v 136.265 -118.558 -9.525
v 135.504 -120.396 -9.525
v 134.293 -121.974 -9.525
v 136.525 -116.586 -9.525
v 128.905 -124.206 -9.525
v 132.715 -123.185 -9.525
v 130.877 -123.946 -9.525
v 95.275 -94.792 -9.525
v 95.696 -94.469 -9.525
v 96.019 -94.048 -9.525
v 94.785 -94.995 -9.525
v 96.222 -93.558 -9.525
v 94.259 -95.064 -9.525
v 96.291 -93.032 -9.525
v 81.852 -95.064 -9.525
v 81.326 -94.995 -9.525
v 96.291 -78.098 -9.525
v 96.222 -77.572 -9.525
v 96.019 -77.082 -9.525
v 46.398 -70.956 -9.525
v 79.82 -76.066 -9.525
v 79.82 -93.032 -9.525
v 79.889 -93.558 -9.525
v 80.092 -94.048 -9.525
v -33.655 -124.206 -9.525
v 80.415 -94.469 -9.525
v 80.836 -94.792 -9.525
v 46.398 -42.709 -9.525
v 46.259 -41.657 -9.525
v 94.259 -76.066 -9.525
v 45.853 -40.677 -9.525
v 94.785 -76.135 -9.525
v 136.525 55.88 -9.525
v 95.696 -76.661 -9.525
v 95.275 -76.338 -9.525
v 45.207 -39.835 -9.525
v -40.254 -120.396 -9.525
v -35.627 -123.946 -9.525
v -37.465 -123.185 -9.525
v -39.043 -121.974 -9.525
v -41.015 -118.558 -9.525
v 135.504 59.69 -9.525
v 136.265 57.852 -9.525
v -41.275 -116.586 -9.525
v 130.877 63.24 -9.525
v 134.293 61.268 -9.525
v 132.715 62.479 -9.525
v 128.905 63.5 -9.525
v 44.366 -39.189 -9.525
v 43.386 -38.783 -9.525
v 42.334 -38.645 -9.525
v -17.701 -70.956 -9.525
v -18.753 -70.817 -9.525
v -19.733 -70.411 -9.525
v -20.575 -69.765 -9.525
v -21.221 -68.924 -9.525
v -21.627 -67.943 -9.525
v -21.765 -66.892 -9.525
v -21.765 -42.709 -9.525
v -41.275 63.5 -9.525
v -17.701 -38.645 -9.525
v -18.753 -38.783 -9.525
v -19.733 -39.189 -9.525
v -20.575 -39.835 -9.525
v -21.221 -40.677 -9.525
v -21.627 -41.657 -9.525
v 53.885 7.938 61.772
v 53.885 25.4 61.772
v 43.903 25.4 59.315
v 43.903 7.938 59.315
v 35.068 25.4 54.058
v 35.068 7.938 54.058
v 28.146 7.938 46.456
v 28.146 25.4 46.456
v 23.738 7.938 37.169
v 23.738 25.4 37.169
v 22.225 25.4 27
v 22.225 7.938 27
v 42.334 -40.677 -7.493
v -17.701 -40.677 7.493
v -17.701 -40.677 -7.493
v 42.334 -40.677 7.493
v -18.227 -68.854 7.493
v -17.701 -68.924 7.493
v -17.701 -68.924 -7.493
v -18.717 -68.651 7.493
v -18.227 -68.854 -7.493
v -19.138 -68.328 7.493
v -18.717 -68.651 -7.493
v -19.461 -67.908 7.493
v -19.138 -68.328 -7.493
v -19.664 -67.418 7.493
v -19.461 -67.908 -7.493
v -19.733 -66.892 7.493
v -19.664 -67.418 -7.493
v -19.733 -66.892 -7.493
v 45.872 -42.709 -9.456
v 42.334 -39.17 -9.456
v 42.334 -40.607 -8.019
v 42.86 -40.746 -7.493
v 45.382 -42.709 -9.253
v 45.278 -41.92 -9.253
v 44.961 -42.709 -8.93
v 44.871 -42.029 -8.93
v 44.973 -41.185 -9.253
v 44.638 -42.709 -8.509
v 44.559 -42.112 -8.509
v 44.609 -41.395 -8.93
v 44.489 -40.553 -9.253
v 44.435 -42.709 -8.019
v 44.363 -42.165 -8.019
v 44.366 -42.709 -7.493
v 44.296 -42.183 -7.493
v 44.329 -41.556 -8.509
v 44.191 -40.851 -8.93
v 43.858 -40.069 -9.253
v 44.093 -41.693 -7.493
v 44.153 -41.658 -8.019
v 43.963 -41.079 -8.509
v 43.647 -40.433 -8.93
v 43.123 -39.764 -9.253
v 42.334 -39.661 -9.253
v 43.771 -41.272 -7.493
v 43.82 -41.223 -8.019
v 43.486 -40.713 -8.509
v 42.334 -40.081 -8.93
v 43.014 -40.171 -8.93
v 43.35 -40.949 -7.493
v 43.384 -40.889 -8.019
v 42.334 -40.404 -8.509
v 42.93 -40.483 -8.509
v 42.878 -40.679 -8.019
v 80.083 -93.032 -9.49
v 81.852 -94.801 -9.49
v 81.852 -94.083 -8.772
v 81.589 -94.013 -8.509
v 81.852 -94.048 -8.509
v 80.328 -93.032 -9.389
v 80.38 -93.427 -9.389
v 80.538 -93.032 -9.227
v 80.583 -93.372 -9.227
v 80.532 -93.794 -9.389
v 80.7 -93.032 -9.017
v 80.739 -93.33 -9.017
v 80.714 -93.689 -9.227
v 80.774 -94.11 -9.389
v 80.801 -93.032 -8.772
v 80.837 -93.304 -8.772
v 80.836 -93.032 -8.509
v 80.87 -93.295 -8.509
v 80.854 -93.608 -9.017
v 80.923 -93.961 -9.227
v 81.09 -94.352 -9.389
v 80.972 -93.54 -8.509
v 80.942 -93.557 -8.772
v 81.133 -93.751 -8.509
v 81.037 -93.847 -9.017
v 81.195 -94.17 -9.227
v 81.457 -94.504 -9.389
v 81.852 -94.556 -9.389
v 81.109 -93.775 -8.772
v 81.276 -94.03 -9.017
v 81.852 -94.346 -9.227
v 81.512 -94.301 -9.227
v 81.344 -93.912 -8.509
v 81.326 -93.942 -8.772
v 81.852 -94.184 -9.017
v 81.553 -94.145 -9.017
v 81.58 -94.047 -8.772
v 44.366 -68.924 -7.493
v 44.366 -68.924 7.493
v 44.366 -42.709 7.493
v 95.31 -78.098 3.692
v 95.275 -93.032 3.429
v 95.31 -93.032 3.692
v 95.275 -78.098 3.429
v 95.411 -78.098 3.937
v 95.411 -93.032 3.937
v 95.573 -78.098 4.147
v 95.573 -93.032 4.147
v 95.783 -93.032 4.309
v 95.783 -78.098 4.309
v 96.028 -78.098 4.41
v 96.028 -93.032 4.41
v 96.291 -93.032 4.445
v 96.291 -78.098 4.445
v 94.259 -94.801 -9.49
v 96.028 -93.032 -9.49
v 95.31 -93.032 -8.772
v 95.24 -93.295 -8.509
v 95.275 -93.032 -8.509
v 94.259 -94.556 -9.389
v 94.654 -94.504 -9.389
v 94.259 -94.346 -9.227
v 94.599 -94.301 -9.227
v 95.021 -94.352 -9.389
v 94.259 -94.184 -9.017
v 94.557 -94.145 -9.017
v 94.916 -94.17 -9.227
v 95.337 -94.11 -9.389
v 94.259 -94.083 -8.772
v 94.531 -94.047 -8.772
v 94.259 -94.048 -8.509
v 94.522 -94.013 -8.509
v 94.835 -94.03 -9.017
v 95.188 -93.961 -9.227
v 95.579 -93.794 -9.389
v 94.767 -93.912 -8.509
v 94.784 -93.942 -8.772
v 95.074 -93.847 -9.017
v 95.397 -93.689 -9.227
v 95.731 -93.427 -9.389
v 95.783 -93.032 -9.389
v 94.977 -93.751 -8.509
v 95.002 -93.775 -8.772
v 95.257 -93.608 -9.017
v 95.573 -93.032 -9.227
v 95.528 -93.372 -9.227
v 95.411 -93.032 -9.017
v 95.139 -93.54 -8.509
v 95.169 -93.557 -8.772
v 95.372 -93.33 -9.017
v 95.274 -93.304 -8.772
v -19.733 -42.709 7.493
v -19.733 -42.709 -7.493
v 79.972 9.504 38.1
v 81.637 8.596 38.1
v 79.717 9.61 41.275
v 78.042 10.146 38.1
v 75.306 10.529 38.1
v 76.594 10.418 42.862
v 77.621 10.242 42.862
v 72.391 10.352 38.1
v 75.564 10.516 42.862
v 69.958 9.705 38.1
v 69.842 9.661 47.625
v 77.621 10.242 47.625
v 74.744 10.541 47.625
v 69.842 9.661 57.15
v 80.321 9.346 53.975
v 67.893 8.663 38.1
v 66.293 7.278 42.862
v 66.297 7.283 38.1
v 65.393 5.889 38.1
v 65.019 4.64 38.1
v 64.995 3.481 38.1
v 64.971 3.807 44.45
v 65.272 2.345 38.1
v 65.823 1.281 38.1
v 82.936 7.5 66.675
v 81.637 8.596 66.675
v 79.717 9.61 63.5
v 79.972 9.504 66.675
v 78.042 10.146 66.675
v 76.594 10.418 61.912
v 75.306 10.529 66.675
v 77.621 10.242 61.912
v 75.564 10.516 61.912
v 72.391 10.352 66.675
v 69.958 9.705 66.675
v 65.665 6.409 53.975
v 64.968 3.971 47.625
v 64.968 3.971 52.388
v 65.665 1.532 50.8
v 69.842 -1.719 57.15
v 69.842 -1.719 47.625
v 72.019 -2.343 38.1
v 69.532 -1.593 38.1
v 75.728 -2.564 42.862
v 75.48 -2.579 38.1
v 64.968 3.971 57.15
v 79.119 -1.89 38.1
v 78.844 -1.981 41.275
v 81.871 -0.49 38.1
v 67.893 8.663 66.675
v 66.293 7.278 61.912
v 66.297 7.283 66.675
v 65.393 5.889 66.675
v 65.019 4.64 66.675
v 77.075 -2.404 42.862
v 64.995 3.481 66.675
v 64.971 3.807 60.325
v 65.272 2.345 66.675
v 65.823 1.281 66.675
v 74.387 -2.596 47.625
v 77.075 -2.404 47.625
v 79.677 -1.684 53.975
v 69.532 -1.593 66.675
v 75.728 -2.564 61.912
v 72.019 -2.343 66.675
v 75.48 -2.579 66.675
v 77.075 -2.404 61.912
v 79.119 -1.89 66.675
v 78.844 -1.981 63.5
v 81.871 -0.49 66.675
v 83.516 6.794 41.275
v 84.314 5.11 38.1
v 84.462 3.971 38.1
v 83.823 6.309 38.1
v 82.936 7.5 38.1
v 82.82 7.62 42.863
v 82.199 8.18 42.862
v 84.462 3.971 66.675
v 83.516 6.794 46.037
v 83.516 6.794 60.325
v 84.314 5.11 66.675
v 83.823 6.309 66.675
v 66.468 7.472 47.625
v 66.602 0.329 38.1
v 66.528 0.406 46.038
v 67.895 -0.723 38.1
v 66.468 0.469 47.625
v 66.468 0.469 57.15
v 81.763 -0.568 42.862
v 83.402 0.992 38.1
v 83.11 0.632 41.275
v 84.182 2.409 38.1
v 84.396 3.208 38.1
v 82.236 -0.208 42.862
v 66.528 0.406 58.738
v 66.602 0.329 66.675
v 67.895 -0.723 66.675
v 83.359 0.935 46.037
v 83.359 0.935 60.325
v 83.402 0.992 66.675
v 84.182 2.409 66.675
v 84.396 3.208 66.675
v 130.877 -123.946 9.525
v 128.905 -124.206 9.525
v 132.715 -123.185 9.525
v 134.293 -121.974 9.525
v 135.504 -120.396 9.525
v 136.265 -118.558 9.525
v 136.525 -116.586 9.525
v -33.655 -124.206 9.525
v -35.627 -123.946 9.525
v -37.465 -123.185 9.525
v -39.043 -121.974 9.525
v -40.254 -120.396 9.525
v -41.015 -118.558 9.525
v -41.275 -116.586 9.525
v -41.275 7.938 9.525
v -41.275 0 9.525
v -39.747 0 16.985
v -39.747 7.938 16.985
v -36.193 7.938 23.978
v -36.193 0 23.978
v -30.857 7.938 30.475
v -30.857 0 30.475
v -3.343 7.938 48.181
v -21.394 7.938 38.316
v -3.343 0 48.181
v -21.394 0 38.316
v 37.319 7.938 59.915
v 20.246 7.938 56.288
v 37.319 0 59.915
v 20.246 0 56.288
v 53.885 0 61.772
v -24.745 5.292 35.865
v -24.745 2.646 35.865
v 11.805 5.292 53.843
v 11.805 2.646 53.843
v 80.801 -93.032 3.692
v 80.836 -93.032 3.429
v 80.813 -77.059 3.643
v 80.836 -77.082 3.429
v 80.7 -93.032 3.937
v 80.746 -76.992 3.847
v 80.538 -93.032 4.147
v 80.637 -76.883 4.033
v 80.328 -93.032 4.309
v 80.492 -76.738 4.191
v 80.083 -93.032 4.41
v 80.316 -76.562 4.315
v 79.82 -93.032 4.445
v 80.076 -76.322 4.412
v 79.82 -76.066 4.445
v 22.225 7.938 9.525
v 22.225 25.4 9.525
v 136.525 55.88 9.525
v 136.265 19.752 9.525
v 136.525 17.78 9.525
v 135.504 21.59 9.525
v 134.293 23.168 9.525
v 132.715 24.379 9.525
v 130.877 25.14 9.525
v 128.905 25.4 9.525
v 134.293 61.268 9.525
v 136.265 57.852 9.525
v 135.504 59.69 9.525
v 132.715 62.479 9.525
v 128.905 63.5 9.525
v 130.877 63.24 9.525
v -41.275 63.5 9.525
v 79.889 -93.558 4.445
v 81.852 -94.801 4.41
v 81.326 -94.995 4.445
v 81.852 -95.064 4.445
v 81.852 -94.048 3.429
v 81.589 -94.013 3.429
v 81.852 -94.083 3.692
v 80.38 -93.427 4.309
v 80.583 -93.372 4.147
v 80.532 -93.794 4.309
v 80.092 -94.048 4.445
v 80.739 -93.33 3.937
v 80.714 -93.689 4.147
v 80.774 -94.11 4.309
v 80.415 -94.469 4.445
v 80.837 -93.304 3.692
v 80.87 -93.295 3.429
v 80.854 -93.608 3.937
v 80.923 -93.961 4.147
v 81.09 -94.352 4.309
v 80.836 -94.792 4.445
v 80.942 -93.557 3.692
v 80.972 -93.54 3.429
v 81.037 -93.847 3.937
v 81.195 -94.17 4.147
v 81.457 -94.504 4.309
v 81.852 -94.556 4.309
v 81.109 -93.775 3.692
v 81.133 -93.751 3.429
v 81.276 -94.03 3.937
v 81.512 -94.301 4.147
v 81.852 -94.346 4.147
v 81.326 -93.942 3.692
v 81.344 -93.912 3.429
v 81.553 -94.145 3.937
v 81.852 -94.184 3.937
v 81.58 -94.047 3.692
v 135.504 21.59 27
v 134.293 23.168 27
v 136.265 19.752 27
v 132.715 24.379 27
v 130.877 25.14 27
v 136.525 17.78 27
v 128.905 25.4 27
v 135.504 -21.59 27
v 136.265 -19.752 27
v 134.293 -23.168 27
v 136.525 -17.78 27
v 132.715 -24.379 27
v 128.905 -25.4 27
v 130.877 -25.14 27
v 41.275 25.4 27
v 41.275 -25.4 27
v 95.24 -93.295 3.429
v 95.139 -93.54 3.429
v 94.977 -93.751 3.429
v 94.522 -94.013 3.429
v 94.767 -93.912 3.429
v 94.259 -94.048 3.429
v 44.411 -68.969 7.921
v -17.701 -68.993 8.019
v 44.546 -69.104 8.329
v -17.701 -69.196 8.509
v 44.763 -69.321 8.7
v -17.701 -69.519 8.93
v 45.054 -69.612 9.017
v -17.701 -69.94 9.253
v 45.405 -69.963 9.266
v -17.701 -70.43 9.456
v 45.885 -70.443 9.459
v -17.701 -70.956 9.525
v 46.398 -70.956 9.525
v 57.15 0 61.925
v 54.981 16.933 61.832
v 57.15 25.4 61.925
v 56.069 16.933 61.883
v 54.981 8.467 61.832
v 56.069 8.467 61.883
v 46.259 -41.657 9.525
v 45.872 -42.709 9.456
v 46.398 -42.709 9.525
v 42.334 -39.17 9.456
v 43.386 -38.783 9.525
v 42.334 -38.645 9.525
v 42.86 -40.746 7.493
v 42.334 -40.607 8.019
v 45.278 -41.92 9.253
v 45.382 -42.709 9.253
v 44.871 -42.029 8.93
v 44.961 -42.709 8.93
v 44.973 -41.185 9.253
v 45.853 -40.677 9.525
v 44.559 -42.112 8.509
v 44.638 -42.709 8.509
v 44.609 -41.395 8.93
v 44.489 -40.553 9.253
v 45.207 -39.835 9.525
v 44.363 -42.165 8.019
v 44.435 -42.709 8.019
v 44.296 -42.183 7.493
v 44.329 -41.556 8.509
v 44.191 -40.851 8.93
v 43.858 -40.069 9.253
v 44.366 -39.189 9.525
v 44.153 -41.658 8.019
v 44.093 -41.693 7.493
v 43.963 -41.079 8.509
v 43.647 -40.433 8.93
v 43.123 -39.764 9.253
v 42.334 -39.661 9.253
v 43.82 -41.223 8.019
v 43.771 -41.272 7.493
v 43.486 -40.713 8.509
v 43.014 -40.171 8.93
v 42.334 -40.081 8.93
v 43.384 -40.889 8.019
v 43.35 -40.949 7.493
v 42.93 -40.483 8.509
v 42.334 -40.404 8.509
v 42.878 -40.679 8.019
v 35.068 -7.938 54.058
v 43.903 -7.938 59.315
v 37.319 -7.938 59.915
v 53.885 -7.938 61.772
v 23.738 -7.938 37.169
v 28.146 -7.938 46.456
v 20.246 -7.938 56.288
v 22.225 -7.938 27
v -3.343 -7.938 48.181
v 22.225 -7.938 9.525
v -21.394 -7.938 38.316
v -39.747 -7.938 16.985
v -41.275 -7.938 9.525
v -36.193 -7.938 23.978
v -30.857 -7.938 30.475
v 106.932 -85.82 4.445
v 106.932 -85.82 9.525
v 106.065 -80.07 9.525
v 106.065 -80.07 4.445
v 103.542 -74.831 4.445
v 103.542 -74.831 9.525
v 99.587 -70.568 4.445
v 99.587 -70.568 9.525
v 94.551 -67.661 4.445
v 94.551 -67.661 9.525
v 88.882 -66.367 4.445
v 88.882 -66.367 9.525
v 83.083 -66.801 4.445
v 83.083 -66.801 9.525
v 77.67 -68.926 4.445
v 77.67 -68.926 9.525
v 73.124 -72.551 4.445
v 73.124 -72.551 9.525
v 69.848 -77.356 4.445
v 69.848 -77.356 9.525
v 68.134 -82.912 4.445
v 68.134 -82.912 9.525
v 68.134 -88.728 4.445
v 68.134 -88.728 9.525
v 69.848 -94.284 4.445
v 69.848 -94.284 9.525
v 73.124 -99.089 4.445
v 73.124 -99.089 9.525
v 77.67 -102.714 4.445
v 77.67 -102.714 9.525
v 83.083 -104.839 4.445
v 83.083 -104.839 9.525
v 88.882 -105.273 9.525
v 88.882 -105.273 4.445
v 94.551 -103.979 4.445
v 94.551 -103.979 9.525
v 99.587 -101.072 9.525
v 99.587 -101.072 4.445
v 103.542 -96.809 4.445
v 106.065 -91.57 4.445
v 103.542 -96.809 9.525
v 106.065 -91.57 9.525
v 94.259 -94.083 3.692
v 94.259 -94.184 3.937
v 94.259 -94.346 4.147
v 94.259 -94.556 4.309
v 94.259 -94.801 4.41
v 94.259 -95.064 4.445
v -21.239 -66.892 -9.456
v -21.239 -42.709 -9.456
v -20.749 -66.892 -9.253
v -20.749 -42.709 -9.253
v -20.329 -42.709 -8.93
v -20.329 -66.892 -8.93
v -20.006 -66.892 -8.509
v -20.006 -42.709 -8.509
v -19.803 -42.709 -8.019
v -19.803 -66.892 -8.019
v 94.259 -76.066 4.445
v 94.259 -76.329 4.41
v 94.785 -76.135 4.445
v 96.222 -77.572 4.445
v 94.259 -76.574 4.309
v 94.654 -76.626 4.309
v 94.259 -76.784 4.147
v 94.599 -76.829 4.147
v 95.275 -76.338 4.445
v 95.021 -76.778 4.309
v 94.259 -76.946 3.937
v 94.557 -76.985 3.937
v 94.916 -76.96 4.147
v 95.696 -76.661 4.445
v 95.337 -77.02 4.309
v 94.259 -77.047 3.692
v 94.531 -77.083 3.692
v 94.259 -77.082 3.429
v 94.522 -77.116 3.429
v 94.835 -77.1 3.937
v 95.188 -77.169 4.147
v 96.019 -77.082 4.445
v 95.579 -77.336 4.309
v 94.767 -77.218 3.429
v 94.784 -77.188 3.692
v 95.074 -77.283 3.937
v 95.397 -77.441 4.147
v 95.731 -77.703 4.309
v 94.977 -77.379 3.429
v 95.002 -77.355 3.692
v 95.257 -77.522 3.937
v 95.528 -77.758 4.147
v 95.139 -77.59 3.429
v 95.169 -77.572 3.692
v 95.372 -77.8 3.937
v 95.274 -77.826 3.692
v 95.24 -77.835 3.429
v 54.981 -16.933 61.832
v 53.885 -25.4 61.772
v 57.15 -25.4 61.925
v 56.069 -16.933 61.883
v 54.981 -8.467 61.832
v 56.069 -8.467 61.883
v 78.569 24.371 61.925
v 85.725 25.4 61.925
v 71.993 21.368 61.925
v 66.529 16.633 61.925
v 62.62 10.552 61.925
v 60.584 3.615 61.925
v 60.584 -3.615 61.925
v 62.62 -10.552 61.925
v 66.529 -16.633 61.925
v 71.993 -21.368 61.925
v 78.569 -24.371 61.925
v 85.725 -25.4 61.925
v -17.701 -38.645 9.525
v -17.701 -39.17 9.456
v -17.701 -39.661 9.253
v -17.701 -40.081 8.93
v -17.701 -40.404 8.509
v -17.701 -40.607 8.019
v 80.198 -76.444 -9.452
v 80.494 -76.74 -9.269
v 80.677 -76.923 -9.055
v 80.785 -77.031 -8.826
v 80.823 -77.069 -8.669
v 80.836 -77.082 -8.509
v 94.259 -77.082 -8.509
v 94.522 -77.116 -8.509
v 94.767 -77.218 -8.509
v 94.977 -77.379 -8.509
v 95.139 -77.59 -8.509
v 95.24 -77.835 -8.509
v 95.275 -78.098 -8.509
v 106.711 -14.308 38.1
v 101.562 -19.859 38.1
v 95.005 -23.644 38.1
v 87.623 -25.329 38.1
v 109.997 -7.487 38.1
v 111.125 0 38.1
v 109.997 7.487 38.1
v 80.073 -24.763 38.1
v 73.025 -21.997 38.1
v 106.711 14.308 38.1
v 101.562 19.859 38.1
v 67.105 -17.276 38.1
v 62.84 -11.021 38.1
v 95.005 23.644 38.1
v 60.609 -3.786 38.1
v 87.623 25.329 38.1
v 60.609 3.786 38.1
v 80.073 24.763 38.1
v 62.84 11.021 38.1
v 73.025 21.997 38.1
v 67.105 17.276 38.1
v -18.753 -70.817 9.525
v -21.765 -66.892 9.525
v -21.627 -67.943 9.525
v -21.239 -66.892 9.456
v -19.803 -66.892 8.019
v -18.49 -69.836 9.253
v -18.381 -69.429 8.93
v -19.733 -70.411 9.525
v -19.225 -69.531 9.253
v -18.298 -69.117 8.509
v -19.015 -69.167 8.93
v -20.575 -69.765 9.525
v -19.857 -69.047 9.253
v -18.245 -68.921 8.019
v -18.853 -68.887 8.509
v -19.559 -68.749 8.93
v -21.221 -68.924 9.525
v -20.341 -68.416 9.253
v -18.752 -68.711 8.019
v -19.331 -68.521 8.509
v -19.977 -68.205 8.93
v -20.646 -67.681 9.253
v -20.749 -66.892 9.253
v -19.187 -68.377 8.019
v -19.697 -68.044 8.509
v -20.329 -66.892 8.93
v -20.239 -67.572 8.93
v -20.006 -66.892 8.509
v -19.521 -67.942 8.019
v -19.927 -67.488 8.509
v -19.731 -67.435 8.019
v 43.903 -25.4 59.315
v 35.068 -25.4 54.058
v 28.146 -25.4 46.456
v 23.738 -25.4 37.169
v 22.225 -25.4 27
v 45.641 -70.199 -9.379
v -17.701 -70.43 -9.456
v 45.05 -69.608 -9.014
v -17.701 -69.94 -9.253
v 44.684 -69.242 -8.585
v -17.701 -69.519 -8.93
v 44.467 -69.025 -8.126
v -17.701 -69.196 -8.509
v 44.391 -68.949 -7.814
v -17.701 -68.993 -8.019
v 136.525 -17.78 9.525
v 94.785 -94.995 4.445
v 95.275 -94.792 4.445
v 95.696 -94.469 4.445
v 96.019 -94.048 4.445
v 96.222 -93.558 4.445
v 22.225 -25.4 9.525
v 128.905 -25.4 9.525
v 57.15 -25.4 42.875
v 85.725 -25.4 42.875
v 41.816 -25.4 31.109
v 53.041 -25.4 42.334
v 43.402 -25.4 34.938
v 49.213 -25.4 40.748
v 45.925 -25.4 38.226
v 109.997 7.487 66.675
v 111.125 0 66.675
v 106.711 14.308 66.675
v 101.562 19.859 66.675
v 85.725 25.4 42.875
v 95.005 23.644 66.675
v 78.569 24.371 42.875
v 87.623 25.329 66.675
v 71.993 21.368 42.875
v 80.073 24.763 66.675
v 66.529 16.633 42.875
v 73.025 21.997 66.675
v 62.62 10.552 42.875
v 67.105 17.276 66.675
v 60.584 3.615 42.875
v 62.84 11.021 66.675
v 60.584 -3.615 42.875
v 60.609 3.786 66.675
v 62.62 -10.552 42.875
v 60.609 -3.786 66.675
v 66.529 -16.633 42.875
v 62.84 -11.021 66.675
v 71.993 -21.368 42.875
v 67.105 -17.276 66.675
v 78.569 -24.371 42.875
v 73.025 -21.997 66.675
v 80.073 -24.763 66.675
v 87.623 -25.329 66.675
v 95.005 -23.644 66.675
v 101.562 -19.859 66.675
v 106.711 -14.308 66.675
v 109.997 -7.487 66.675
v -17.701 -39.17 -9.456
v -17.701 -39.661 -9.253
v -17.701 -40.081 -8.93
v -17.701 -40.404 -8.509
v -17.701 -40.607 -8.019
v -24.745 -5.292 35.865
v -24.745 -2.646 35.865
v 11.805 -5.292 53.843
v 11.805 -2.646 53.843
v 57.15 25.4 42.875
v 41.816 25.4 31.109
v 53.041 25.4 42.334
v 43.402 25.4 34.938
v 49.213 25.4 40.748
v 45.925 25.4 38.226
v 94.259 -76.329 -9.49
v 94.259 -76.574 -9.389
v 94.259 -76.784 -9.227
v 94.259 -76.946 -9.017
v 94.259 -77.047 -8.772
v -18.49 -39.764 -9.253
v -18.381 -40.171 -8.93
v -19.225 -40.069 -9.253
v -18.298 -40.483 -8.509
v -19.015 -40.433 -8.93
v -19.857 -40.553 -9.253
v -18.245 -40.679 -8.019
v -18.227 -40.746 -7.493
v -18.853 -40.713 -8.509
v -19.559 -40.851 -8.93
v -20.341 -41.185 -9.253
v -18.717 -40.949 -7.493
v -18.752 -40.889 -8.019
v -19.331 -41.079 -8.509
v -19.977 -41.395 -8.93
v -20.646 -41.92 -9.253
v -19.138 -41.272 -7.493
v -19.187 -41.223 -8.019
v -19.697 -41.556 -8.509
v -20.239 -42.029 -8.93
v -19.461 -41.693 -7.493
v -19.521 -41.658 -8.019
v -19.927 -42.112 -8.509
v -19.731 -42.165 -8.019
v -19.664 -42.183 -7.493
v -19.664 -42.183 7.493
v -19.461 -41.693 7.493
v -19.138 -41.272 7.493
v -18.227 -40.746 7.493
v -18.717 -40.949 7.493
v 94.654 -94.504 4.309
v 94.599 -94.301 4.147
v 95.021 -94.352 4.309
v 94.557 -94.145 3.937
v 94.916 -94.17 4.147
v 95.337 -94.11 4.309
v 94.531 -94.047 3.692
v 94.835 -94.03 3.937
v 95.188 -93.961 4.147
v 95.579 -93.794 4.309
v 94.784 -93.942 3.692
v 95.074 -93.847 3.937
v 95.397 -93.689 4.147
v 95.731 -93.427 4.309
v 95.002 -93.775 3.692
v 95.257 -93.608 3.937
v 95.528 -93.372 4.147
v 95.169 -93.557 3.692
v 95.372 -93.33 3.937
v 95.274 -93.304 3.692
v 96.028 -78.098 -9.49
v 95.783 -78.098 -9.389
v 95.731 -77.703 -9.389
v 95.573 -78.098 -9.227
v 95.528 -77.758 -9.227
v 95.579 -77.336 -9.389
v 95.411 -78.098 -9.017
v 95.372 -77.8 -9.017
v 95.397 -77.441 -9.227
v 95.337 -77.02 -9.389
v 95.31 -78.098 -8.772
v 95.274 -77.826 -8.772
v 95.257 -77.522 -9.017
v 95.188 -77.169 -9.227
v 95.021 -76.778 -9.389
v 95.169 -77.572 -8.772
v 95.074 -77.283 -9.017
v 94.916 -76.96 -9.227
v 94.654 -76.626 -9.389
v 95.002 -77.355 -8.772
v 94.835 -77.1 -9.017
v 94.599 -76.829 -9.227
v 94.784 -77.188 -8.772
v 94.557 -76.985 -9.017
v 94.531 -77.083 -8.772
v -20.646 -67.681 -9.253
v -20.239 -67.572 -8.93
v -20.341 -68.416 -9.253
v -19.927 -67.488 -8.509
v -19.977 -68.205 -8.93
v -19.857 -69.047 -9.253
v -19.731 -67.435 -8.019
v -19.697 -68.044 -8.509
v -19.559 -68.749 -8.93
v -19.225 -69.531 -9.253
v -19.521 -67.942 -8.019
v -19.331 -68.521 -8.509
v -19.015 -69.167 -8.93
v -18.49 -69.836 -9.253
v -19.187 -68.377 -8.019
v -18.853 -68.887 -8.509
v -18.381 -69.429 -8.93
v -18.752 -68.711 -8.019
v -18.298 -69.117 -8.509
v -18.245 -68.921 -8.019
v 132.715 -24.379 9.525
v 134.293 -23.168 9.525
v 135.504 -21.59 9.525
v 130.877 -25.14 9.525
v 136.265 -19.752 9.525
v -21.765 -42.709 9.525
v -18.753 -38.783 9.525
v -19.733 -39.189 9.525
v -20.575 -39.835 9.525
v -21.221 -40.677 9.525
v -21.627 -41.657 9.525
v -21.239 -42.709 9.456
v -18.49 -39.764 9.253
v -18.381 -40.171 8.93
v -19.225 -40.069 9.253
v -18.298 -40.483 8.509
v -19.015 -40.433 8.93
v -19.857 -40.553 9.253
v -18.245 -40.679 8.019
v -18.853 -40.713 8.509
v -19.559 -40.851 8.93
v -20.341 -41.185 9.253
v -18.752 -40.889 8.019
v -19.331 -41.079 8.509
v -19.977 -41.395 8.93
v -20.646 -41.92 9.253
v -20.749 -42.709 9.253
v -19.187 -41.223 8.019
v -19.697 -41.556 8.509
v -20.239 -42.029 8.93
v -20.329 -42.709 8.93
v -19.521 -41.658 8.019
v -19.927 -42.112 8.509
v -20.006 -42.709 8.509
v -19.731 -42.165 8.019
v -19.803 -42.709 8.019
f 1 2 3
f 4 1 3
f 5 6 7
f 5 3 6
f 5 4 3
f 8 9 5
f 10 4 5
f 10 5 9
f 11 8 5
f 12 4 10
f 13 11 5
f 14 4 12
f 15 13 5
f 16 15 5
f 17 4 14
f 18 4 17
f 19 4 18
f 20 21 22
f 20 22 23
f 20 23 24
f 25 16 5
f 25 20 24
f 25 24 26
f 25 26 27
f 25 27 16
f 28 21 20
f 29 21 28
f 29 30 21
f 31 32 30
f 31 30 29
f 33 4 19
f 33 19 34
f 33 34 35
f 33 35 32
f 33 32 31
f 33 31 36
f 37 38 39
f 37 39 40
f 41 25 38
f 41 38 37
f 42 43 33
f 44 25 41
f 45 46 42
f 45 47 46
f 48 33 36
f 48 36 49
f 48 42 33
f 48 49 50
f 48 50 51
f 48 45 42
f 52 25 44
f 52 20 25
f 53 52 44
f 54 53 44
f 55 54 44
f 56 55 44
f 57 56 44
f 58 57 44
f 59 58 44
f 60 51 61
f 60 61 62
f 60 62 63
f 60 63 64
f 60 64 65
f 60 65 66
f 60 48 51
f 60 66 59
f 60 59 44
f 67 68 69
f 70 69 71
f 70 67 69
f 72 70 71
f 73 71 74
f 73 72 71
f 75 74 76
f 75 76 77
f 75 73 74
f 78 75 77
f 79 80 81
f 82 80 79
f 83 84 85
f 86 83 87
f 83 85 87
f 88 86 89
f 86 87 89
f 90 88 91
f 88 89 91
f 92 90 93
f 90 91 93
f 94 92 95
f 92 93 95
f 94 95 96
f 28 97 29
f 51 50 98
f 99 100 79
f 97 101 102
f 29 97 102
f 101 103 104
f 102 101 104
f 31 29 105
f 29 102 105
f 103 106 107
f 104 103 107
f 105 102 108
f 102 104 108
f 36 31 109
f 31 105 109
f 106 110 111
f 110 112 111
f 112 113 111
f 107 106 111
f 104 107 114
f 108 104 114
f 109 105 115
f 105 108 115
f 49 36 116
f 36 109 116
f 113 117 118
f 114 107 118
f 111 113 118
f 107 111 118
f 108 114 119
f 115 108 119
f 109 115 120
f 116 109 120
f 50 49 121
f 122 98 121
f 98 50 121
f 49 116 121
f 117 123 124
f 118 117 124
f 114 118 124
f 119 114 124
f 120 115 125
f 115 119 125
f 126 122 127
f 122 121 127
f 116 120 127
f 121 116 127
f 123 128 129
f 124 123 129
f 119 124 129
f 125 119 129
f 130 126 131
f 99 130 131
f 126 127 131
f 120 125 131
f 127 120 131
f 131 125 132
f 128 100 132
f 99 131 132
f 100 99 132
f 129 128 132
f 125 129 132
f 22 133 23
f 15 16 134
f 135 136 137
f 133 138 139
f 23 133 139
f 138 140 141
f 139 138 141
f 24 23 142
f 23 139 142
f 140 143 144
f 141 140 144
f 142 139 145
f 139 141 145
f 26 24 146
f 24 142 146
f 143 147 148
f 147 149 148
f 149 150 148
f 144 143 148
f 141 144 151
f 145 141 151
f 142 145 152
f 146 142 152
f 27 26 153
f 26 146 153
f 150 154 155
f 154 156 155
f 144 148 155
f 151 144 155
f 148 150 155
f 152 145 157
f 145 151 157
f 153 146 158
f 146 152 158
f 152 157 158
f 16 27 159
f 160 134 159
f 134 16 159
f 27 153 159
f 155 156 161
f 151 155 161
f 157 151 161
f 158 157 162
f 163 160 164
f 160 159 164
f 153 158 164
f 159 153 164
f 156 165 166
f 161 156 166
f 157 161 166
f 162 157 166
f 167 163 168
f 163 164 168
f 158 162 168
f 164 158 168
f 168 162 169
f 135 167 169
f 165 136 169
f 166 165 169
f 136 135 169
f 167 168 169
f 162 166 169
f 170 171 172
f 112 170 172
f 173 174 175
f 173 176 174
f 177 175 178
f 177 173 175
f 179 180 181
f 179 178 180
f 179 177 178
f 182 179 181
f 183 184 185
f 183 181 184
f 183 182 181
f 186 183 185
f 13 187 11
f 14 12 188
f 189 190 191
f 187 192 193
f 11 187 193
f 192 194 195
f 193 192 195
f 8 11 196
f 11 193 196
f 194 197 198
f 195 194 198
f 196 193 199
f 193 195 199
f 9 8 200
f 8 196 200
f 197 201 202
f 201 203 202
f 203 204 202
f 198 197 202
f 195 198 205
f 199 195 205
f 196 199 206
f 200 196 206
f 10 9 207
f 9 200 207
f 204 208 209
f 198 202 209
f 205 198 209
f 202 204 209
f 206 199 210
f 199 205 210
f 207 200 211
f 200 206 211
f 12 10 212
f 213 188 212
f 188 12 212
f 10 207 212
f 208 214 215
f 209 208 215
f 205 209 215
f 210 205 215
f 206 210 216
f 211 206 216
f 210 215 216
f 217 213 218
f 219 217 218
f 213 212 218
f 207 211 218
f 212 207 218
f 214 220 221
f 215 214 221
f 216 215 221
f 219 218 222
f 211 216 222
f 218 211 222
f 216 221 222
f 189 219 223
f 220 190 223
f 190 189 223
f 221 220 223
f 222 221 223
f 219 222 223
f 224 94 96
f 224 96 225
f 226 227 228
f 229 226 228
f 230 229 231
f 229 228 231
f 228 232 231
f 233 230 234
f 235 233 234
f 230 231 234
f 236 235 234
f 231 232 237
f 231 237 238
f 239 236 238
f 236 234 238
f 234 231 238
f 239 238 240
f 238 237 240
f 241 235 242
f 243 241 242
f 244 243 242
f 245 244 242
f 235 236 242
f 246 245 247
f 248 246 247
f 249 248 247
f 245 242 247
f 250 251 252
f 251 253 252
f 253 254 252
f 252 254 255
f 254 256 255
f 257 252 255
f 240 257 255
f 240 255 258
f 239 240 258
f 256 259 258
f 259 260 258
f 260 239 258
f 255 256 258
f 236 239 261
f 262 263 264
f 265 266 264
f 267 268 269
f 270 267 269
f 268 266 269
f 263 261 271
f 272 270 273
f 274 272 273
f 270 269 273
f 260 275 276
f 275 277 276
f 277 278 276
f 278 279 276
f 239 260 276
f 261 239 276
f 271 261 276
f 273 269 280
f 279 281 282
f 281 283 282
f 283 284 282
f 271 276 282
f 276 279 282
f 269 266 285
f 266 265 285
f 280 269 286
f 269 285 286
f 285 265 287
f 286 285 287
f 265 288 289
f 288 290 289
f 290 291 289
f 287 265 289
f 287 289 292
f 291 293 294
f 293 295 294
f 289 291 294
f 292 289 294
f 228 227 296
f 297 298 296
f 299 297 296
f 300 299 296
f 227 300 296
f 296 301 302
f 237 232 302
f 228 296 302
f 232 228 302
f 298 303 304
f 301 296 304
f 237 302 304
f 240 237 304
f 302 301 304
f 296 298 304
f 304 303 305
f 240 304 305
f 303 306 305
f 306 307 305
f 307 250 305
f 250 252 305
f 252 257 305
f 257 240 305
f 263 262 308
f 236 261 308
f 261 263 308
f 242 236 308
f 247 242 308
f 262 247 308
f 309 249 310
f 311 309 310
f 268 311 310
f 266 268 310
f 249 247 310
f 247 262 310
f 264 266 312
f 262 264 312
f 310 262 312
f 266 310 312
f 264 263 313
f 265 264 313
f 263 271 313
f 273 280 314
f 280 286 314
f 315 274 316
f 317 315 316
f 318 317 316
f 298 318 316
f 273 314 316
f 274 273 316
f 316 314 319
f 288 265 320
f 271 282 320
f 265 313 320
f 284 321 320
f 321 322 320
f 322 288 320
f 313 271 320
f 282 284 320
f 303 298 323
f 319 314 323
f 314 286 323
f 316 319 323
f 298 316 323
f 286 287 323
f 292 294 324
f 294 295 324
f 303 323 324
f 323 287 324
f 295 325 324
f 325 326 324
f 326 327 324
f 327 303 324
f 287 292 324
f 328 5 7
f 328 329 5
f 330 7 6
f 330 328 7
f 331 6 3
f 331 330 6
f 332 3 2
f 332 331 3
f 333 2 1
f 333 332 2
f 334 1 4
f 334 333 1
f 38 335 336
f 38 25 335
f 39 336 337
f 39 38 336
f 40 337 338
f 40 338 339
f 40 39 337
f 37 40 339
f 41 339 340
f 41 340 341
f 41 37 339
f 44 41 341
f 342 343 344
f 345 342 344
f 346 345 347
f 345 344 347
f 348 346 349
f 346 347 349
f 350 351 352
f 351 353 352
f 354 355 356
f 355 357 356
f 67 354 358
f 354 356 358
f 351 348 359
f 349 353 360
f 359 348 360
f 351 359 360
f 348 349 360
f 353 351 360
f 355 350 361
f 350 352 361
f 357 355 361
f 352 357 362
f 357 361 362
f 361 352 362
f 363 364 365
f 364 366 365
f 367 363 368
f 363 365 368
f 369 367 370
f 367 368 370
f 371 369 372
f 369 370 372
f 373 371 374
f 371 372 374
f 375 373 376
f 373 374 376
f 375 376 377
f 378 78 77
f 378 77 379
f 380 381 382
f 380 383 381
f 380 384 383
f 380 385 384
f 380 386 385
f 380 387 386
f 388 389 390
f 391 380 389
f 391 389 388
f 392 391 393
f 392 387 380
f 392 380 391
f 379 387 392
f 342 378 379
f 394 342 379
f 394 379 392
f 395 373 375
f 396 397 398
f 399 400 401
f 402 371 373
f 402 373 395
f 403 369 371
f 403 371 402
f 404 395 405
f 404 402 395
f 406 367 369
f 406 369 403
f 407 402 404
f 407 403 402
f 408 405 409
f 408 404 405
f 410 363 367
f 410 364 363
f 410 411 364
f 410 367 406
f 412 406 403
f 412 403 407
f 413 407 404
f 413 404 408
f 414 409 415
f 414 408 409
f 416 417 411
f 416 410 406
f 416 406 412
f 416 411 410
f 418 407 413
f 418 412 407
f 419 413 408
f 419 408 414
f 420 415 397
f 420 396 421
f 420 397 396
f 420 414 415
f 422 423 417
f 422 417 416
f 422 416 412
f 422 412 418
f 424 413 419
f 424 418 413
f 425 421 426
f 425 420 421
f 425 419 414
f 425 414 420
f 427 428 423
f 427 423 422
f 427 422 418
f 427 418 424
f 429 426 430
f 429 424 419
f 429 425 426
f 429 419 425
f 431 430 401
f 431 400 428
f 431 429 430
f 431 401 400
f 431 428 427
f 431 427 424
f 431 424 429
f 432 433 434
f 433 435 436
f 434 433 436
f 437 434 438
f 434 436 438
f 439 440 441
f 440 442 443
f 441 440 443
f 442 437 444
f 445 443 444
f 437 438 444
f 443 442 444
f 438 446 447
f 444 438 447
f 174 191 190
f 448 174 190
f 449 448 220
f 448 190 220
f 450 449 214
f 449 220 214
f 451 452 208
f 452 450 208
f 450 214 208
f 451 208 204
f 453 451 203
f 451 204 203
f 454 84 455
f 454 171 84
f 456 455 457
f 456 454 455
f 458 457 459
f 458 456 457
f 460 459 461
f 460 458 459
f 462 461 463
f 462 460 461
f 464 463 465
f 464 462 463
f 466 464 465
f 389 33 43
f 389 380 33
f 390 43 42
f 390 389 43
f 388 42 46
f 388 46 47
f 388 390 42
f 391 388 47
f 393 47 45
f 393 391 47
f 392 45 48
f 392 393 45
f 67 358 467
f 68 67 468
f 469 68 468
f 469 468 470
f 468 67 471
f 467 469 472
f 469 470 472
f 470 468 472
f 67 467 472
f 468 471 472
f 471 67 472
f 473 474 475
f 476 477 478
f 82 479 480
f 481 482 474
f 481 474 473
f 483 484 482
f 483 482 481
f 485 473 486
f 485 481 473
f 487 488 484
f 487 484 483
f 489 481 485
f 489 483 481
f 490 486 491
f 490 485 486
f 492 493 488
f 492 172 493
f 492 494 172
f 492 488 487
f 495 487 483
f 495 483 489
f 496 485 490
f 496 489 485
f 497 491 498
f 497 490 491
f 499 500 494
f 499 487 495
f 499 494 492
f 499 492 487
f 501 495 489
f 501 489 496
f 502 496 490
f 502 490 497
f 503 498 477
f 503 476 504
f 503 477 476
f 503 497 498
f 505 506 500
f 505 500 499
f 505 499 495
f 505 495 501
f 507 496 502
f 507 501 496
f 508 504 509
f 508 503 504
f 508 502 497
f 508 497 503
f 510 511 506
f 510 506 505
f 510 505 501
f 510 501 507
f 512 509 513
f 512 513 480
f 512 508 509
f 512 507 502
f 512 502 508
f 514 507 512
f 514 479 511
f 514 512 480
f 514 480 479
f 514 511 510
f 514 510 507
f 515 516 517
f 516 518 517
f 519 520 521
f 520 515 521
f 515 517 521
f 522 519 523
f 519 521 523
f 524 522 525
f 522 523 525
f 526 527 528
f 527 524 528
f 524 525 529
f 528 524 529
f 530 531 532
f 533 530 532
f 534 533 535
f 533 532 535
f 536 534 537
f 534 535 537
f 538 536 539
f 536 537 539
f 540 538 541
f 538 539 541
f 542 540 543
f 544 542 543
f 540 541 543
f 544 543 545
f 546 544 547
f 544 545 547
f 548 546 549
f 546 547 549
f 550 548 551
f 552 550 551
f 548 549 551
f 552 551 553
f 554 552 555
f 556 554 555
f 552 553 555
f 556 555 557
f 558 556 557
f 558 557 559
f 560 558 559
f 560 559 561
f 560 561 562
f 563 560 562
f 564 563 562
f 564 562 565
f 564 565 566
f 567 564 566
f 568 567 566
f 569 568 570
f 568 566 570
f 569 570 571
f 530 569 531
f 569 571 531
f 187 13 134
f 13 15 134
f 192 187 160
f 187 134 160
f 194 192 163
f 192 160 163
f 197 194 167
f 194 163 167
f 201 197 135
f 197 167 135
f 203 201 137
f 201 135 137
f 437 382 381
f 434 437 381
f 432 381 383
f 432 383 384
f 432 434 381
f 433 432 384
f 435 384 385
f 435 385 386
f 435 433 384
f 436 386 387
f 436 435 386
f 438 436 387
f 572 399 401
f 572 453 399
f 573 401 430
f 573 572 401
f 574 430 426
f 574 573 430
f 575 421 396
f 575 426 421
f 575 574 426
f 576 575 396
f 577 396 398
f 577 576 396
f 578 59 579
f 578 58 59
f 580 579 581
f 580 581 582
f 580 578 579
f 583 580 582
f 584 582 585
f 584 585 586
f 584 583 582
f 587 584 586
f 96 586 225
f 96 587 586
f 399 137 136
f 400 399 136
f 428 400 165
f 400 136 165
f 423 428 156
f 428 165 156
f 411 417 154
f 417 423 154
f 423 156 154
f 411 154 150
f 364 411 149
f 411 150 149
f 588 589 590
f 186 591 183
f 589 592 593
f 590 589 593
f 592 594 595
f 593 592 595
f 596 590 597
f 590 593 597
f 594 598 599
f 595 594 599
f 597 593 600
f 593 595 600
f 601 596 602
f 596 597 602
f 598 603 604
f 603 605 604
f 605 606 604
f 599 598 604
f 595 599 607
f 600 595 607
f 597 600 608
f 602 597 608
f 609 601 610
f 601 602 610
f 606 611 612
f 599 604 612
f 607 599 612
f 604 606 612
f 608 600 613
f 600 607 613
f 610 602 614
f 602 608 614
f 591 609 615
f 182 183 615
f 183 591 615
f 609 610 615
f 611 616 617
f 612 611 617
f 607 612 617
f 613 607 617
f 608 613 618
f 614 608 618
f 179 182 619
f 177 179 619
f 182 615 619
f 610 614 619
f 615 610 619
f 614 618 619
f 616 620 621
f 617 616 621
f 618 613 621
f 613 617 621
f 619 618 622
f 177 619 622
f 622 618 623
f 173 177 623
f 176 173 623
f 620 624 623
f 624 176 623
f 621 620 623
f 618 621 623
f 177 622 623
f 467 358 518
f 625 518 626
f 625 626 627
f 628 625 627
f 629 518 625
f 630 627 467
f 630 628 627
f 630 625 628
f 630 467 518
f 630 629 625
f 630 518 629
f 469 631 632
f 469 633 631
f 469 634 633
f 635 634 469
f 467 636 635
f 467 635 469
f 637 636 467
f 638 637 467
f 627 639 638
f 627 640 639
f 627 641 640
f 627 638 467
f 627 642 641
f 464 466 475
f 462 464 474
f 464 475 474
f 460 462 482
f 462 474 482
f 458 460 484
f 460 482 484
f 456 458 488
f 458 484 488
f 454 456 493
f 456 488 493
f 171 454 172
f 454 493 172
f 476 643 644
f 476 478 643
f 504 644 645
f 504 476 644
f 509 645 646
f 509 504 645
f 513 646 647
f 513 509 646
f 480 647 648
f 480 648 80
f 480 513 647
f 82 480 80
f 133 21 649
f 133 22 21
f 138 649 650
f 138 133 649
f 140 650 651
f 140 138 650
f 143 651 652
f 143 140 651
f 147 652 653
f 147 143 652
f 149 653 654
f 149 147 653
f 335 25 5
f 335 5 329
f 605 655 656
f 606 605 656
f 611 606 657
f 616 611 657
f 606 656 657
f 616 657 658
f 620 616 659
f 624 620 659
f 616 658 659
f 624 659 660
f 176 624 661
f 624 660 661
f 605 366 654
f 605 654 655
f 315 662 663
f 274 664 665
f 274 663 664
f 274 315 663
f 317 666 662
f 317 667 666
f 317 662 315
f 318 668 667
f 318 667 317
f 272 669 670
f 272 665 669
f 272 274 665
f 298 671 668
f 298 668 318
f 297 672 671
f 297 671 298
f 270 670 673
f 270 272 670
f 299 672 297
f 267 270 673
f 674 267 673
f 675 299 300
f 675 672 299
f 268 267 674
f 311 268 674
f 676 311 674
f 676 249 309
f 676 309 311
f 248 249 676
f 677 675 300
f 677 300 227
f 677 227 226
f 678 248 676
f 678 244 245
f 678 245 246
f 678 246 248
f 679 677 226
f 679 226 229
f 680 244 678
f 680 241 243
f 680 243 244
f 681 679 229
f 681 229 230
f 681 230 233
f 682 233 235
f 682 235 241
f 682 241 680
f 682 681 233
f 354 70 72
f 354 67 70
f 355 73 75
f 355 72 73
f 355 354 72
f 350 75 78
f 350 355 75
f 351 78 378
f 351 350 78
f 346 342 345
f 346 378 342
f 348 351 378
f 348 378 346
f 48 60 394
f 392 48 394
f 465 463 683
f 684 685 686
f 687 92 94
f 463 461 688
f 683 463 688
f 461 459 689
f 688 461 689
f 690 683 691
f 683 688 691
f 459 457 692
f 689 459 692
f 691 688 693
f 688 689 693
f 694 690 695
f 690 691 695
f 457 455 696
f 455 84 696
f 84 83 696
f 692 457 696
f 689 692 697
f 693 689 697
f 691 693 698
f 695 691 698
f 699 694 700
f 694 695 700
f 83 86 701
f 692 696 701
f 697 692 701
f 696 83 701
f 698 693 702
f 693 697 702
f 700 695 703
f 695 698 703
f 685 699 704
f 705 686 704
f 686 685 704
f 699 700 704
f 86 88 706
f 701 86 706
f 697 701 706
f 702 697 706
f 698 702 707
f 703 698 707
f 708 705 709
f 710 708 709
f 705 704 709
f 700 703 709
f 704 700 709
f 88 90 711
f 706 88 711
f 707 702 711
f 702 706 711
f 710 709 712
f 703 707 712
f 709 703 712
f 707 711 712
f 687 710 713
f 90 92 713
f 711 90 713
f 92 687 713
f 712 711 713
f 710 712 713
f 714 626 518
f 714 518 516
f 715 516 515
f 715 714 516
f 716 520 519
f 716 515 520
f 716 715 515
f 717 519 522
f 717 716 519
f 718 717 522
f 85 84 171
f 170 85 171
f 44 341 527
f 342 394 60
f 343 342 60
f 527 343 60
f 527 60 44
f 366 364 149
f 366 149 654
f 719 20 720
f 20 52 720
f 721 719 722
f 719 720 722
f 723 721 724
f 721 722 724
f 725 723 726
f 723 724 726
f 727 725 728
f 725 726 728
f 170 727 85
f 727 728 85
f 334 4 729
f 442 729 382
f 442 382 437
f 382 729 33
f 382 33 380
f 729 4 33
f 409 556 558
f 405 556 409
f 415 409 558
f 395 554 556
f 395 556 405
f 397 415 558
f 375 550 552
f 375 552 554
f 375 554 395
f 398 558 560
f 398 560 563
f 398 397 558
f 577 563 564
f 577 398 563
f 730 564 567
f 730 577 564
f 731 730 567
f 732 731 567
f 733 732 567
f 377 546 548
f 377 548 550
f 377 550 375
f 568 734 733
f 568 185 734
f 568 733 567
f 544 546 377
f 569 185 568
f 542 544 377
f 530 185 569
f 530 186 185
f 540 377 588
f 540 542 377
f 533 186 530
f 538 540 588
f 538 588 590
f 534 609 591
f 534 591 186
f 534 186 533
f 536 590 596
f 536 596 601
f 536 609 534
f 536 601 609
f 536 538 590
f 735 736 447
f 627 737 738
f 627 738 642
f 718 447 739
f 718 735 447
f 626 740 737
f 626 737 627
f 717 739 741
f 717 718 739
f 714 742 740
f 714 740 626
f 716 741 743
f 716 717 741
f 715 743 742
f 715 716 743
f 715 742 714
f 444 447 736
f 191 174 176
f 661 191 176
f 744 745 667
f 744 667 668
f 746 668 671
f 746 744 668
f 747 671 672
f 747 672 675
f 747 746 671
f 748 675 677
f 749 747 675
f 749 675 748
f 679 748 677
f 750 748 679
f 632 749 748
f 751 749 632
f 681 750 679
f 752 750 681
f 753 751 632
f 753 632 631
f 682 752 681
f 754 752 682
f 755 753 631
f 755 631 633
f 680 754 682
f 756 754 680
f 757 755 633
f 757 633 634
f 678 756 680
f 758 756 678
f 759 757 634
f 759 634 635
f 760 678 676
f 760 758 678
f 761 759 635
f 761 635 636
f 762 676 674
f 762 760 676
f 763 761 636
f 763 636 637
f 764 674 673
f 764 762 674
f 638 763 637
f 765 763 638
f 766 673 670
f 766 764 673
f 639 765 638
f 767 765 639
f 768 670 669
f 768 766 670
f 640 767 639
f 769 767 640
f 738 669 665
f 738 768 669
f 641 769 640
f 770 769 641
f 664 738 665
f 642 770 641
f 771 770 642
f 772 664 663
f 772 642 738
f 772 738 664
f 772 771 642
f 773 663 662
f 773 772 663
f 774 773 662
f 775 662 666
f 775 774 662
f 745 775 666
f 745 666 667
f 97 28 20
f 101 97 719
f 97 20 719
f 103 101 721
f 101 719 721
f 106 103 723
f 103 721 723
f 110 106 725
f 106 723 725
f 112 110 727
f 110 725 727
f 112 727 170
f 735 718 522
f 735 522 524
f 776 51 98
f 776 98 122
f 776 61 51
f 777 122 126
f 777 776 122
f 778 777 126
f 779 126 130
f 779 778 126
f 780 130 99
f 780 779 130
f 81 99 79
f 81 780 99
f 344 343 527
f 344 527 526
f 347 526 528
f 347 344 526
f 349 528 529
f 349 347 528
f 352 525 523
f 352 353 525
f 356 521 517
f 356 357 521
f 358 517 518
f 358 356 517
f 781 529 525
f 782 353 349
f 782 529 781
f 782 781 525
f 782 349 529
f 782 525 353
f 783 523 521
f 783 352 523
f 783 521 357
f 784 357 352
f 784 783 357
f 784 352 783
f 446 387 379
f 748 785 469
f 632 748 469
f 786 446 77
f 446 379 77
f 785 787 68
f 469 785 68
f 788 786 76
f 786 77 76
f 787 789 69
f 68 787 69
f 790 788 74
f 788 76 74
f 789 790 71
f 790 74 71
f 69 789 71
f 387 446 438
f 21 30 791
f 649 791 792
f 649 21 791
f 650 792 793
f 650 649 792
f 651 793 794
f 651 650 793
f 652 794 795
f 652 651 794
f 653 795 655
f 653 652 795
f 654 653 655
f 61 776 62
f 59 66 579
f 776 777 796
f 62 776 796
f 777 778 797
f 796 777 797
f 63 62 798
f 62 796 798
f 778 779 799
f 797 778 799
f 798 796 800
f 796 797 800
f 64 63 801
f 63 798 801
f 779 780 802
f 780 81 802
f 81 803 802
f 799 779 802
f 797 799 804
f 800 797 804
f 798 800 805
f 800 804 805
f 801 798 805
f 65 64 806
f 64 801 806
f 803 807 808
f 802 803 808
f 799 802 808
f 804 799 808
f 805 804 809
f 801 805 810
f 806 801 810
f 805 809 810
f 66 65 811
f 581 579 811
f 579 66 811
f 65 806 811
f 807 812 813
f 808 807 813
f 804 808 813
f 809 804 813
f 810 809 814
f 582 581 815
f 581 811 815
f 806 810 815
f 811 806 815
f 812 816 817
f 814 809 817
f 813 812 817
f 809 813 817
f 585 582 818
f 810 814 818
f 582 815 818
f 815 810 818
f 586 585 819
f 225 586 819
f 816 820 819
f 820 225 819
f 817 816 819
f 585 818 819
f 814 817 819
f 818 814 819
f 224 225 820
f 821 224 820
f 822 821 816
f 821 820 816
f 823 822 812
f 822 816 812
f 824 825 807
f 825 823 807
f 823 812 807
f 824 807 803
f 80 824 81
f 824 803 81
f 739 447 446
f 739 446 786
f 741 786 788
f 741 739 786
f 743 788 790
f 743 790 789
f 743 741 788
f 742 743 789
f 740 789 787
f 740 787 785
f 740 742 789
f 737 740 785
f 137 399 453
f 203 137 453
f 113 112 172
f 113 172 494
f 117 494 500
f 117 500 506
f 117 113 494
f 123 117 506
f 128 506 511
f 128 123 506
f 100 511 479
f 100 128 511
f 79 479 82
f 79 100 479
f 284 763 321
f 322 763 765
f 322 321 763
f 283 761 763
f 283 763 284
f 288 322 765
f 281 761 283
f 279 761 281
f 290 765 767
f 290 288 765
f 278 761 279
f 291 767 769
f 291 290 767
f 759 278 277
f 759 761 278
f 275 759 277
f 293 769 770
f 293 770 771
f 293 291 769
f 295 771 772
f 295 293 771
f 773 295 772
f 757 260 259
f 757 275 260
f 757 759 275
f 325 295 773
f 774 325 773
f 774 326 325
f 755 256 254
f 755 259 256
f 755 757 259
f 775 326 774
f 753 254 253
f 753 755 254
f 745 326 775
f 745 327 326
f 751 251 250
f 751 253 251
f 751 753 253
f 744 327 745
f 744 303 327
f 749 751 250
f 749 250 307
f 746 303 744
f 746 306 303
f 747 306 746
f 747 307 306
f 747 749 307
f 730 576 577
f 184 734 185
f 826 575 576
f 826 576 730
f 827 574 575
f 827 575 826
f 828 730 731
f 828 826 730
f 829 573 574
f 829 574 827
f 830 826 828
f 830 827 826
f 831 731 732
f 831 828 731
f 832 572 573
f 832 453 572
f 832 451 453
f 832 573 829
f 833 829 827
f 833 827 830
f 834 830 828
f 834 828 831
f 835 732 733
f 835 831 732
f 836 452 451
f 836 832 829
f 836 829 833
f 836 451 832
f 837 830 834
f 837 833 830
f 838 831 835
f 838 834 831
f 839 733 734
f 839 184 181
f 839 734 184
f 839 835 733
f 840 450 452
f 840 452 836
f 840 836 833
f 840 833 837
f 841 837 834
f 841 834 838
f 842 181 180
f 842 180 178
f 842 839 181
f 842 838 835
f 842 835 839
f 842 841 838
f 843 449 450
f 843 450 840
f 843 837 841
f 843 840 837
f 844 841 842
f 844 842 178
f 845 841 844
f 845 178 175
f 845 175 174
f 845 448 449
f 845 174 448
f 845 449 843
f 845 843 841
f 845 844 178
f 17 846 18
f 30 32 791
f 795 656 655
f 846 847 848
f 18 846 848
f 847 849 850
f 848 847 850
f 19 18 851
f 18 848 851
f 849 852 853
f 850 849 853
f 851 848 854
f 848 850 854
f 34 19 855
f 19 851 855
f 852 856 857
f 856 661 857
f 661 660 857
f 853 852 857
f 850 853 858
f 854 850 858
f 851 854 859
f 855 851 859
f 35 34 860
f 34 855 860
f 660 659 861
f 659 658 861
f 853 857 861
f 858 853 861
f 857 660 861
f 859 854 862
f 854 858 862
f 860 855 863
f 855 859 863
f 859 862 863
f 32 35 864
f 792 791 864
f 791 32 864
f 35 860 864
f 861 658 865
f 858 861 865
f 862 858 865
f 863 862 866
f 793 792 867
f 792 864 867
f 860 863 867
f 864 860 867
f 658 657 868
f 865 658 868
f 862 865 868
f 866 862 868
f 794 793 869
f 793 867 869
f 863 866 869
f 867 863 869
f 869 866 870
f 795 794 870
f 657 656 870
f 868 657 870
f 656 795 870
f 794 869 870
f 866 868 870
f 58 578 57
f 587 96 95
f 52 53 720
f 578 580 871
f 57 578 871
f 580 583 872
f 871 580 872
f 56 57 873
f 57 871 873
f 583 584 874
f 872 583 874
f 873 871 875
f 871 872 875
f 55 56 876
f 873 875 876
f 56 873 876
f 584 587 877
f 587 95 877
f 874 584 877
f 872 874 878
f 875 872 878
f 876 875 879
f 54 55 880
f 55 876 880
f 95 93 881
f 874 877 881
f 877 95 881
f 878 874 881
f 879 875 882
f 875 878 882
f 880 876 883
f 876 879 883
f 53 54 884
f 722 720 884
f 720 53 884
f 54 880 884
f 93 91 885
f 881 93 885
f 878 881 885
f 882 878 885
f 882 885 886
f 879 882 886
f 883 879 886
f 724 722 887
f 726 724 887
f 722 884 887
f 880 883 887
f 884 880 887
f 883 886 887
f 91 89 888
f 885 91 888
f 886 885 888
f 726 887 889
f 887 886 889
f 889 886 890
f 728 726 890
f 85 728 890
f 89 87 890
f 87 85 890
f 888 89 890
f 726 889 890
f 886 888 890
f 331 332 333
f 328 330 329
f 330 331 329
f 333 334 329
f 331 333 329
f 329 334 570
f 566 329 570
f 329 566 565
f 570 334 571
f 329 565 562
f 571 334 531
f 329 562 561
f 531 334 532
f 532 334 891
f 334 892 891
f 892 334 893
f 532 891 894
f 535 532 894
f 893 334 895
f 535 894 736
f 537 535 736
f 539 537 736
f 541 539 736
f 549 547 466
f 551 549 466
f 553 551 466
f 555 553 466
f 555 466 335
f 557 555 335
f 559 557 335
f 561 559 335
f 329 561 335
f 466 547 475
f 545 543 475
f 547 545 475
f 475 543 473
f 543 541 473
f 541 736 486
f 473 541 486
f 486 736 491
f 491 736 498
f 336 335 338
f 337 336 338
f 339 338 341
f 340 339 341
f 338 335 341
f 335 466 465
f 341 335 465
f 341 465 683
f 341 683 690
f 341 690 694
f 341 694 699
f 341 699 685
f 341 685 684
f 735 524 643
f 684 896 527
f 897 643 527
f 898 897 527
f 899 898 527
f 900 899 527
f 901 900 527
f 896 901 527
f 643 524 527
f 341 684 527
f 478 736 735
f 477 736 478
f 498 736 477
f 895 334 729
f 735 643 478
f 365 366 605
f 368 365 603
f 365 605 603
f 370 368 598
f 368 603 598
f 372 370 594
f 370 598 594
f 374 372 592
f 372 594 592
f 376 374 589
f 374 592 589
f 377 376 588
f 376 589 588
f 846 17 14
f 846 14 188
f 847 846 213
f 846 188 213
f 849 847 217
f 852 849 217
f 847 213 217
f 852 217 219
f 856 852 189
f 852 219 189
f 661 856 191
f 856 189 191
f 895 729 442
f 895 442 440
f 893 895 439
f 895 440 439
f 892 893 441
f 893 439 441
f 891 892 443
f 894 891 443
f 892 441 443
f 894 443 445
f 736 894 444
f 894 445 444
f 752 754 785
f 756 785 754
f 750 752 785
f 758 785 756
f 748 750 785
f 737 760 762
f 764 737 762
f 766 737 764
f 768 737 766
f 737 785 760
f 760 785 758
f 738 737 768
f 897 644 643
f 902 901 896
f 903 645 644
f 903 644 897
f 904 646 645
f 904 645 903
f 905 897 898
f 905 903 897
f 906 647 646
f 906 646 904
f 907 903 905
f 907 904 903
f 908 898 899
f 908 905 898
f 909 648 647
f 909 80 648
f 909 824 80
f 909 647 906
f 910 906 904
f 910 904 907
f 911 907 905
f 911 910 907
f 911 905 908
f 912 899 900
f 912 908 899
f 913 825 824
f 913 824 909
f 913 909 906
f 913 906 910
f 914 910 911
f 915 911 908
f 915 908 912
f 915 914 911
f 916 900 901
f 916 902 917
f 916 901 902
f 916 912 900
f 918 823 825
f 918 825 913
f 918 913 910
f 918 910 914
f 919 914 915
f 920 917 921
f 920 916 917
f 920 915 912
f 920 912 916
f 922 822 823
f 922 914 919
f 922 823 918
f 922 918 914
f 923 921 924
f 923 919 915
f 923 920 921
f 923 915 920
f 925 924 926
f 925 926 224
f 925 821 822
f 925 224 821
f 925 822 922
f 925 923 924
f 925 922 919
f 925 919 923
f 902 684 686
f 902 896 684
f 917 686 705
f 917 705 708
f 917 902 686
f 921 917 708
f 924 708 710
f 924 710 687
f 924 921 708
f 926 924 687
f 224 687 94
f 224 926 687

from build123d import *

# Parameters (mm, degrees)
F1_DEPTH  = 63.5
F0_W      = 25.4
F0_H      = 19.05
F2_DEPTH  = 25.4
F3_DEPTH  = 7.9375
F5_DEPTH  = 95.25
F6_DEPTH  = 60.706
F7_W      = 64.0991125256
F7_H      = 28.2470658422
F8_DEPTH  = 25.4
F9_R      = 19.5079134093
F10_DEPTH = 5.08
F11_W     = 14.4394114614
F11_H     = 16.9663056731
F12_DEPTH = 25.4
F14_DEPTH = 28.575
F15_R     = 7.62
F16_R     = 2.032
F17_R     = 1.016


with BuildPart() as f1:
    # F0 (on Front) → F1 (new body, symmetric)
    with BuildSketch(Plane.XZ):
        Polygon((22.225, 9.525), (-41.275, 9.525), (-41.275, -9.525), (41.275, -9.525), (41.275, 9.525), align=None)
    extrude(amount=F1_DEPTH, both=True)

    # F0 (on Front) → F2 (join, symmetric)
    with BuildSketch(Plane.XZ):
        with BuildLine():
            Line((22.225, 27.0002), (22.225, 9.525))
            Line((22.225, 9.525), (41.275, 9.525))
            Line((41.275, 9.525), (41.275, 27.0002))
            ThreePointArc((41.275, 27.0002), (45.9246798487, 38.2255201513), (57.15, 42.8752))
            Line((57.15, 42.8752), (60.325, 42.8752))
            Line((60.325, 42.8752), (60.325, 61.9252))
            Line((60.325, 61.9252), (57.15, 61.9252))
            add(Edge.make_bspline(
                [(53.8854342407, 61.7722898912), (54.9842067368, 61.8365871986), (56.0728453275, 61.8876096574), (57.15, 61.9252)],
                knots=[108.5245810491, 108.5245810491, 108.5245810491, 108.5245810491, 111.5045361635, 111.5045361635, 111.5045361635, 111.5045361635], degree=3))
            ThreePointArc((53.8854342407, 61.7722898912), (31.3258777096, 50.5133948686), (22.225, 27.0002))
        make_face()
        with Locations((73.025, 52.4002)):
            Rectangle(F0_W, F0_H)
    extrude(amount=F2_DEPTH, both=True)

    # F0 (on Front) → F3 (join, symmetric)
    with BuildSketch(Plane.XZ):
        with BuildLine():
            add(Edge.make_bspline(
                [(-41.275, 9.525), (-39.5856284224, 39.4828766469), (13.870125209, 59.4306981306), (53.8854342407, 61.7722898912)],
                knots=[0, 0, 0, 0, 108.5245810491, 108.5245810491, 108.5245810491, 108.5245810491], degree=3))
            Line((-41.275, 9.525), (22.225, 9.525))
            Line((22.225, 9.525), (22.225, 27.0002))
            ThreePointArc((22.225, 27.0002), (31.3258777096, 50.5133948686), (53.8854342407, 61.7722898912))
        make_face()
    extrude(amount=F3_DEPTH, both=True)

    # F0 (on Front) → F4 (revolve)
    with BuildSketch(Plane.XZ):
        Polygon((85.725, 66.675), (85.725, 61.9252), (85.725, 42.8752), (85.725, 38.1), (111.125, 38.1), (111.125, 66.675), align=None)
    revolve(axis=Axis((85.725, 0, 52.3875), (0, 0, 1)))

    # F5 (add): a face of the model
    f5_faces = [f1.faces().sort_by_distance(p)[0] for p in [
        (41.275, 0, 4.9023288334),
    ]]
    extrude(f5_faces, amount=F5_DEPTH)

    # F6 (add): a face of the model
    f6_faces = [f1.faces().sort_by_distance(p)[0] for p in [
        (47.625, -63.5, 0),
    ]]
    extrude(f6_faces, amount=F6_DEPTH)

    # F7 (on face) → F8 (cut)
    with BuildSketch(Plane.XY.offset(9.525)):
        with Locations((12.3161775991, -54.8000894487)):
            Rectangle(F7_W, F7_H)
    extrude(amount=-F8_DEPTH, mode=Mode.SUBTRACT)

    # F9 (on face) → F10 (cut)
    with BuildSketch(Plane.XY.offset(9.525)):
        with Locations((87.4239131329, -85.8199995224)):
            Circle(F9_R)
    extrude(amount=-F10_DEPTH, mode=Mode.SUBTRACT)

    # F11 (on face) → F12 (cut)
    with BuildSketch(Plane.XY.offset(9.525)):
        with Locations((88.0553610623, -85.5649597943)):
            Rectangle(F11_W, F11_H)
    extrude(amount=-F12_DEPTH, mode=Mode.SUBTRACT)

    # F13 (on face) → F14 (cut, through all)
    with BuildSketch(Plane.XY.offset(66.675)):
        with BuildLine():
            add(Edge.make_bspline(
                [(84.4615474343, 3.9708414115), (84.4615474343, 15.3508284031), (69.8416419327, 9.6608349073), (55.2217364311, 3.9708414115), (69.8416419327, -1.7191520843), (84.4615474343, -7.4091455801), (84.4615474343, 3.9708414115)],
                knots=[0, 0, 0, 2.0943951024, 2.0943951024, 4.1887902048, 4.1887902048, 6.2831853072, 6.2831853072, 6.2831853072], degree=2, weights=[1, 0.5, 1, 0.5, 1, 0.5, 1]))
        make_face()
    extrude(amount=-F14_DEPTH, mode=Mode.SUBTRACT)

    # F15
    f15_edges = [f1.edges().sort_by_distance(p)[0] for p in [
        (-41.275, -124.206, 0),
        (136.525, -124.206, 0),
        (136.525, -25.4, 18.2626),
        (136.525, 25.4, 18.2626),
        (136.525, 63.5, 0),
    ]]
    fillet(f15_edges, radius=F15_R)

    # F16
    f16_edges = [f1.edges().sort_by_distance(p)[0] for p in [
        (-19.733379, -54.800089, 9.525),
        (-19.733379, -68.923622, 0),
        (-19.733379, -54.800089, -9.525),
        (-19.733379, -40.676557, 0),
        (12.316178, -40.676557, 9.525),
        (12.316178, -40.676557, -9.525),
        (44.365734, -40.676557, 0),
        (12.316178, -68.923622, -9.525),
        (44.365734, -54.800089, -9.525),
        (12.316178, -68.923622, 9.525),
        (44.365734, -54.800089, 9.525),
    ]]
    fillet(f16_edges, radius=F16_R)

    # F17
    f17_edges = [f1.edges().sort_by_distance(p)[0] for p in [
        (88.055361, -77.081807, 4.445),
        (95.275067, -85.56496, 4.445),
        (95.275067, -77.081807, -2.54),
        (95.275067, -85.56496, -9.525),
        (95.275067, -94.048113, -2.54),
        (80.835655, -85.56496, 4.445),
        (88.055361, -94.048113, 4.445),
        (88.055361, -94.048113, -9.525),
        (80.835655, -94.048113, -2.54),
        (80.835655, -85.56496, -9.525),
        (88.055361, -77.081807, -9.525),
    ]]
    fillet(f17_edges, radius=F17_R)


solid = f1.part
